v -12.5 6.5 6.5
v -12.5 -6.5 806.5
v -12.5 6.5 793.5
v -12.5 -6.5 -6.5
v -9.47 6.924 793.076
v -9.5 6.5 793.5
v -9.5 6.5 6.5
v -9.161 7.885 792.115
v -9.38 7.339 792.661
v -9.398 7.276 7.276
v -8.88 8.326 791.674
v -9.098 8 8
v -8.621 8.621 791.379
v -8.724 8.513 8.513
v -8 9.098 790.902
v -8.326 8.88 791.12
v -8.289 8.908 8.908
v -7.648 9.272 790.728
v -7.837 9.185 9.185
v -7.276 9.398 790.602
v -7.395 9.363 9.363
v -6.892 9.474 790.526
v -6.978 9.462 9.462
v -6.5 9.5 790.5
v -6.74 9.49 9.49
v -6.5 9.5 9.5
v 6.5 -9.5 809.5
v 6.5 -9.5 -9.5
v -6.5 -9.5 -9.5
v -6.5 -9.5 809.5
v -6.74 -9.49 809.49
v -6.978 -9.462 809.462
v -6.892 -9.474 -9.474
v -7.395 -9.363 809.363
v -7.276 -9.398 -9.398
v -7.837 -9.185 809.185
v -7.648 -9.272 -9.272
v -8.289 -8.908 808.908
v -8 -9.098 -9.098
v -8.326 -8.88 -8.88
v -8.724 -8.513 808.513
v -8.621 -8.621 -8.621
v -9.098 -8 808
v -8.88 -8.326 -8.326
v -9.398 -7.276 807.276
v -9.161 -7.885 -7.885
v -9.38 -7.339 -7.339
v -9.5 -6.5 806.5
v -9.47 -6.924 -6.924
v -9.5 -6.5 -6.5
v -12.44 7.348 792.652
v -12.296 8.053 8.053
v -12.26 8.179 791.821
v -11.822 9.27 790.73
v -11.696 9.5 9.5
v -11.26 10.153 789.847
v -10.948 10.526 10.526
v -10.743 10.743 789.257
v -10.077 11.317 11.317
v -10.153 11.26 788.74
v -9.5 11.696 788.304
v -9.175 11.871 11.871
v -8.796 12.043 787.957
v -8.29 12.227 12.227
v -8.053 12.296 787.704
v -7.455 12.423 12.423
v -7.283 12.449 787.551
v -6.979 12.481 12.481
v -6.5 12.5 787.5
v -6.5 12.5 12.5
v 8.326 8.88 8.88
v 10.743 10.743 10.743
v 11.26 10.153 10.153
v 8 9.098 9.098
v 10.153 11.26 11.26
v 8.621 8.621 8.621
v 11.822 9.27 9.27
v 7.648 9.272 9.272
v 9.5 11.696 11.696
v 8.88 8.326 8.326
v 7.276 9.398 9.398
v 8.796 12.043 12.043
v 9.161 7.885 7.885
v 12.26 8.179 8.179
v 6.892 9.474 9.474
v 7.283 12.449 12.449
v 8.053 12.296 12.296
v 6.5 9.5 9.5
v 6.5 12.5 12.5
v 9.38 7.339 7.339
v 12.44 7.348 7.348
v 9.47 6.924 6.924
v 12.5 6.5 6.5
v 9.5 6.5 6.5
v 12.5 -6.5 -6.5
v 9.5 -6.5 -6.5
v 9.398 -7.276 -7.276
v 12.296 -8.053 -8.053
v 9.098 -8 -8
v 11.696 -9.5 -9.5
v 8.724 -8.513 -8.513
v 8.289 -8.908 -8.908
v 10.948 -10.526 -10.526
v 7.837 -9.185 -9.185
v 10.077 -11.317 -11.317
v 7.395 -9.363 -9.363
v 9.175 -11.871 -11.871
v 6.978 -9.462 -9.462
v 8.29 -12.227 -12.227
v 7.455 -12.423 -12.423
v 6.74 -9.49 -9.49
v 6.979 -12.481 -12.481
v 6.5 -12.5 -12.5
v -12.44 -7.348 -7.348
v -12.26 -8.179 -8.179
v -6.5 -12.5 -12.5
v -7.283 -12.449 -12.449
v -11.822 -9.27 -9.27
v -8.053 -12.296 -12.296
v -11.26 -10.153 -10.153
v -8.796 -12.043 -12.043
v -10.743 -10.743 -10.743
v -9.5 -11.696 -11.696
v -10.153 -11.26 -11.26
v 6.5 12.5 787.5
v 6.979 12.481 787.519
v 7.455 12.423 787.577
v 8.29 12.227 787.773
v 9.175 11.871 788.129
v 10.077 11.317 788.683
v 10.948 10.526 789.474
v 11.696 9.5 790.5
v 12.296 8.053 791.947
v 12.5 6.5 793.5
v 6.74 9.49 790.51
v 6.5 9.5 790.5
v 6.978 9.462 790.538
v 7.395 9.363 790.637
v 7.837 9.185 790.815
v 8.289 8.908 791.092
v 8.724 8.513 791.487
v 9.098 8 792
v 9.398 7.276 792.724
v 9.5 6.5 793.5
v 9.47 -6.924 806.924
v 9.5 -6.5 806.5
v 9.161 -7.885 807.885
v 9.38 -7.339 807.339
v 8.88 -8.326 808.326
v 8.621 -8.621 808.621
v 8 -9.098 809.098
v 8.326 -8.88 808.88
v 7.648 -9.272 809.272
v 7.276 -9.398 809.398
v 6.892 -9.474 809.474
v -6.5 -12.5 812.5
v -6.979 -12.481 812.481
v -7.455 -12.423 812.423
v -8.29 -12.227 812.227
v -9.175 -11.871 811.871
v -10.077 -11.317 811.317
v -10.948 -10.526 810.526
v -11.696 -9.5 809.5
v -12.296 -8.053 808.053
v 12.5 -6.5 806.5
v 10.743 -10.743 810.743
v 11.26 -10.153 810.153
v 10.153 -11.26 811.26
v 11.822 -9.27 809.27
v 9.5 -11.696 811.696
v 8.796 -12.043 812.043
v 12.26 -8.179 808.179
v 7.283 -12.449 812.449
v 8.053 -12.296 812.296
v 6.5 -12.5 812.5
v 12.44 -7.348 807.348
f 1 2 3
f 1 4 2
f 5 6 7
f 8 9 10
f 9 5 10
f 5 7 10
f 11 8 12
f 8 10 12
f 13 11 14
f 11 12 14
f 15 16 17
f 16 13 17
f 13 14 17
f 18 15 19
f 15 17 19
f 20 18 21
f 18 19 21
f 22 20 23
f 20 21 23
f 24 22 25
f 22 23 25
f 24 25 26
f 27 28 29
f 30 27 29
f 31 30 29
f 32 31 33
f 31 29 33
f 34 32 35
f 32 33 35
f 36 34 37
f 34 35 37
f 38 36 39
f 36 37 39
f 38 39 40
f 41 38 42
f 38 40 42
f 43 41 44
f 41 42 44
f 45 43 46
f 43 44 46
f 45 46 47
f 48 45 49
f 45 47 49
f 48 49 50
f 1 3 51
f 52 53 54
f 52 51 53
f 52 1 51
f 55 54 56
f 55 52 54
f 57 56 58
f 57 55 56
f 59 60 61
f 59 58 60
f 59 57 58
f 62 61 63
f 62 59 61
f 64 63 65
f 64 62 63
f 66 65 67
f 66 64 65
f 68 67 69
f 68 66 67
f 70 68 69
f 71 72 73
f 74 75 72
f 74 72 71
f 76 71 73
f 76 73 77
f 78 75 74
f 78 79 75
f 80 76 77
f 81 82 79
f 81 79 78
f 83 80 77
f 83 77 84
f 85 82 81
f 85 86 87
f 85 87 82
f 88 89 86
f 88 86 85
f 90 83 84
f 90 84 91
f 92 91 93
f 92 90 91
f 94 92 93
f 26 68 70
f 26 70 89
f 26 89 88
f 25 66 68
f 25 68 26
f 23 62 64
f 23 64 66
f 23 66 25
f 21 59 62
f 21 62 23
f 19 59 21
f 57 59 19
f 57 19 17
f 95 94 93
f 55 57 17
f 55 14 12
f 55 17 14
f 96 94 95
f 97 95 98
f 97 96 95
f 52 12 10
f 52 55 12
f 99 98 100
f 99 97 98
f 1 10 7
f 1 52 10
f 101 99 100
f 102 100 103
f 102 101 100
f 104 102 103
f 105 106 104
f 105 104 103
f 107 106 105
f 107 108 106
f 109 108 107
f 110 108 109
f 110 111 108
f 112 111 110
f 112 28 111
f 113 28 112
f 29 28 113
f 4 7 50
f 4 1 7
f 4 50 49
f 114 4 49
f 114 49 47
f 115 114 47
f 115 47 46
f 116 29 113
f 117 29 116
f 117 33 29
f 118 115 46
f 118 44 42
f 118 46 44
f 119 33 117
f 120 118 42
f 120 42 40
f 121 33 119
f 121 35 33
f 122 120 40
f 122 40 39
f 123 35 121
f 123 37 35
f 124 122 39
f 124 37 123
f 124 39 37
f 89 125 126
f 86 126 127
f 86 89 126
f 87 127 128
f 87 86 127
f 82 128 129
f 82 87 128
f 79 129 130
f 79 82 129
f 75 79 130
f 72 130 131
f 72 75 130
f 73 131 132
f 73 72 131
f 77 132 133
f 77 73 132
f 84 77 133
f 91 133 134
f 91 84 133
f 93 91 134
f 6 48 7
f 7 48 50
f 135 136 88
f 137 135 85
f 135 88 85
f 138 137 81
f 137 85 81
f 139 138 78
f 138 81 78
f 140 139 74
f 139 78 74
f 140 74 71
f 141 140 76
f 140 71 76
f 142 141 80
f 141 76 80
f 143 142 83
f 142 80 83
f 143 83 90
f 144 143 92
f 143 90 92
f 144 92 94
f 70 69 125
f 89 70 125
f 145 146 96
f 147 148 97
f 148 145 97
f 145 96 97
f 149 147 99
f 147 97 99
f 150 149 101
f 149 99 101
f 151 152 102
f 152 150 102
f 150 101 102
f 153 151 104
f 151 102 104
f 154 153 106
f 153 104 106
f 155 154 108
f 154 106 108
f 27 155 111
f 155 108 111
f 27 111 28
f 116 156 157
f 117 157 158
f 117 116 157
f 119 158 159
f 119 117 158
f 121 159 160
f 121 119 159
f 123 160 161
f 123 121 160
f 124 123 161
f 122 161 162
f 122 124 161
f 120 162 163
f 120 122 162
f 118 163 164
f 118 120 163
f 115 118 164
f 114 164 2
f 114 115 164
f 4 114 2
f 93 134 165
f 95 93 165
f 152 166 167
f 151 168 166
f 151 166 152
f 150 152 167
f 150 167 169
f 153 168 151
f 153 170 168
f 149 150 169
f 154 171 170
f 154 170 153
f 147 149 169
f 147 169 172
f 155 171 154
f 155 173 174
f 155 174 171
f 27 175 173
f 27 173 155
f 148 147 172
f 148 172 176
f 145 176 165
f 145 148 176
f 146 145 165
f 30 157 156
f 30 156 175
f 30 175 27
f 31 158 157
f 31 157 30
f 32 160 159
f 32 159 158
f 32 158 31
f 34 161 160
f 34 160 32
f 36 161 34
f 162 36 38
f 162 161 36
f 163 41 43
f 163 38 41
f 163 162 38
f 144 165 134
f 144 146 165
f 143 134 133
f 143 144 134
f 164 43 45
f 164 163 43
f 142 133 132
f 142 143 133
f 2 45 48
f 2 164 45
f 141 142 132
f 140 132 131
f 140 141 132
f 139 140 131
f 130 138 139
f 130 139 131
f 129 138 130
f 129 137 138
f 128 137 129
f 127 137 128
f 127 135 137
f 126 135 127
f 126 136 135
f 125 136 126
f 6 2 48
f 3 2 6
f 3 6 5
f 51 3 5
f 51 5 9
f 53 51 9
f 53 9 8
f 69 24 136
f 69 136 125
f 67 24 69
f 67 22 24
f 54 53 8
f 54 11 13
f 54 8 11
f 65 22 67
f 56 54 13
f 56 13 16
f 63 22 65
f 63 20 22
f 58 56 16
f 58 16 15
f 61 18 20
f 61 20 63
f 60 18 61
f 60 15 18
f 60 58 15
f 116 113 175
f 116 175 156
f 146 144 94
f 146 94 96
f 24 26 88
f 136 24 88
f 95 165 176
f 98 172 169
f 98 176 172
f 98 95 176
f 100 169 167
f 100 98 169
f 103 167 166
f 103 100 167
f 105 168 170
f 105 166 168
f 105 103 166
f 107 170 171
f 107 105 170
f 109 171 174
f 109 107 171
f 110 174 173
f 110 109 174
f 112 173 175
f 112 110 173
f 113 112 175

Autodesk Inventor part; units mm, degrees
ref_plane "Start plane" through (0, 0, -12.5) normal (0, 0, 1) x (1, 0, 0)
ref_plane "End plane" through (0, 0, 812.5) normal (0, 0, 1) x (1, 0, 0)
sketch "Sketch" plane through (0, 0, 0) normal (0, 0, 1) x (1, 0, 0)
  line L0 (-12.5, -6.5) -> (-12.5, 6.5)
  line L1 (-6.5, 12.5) -> (6.5, 12.5)
  line L2 (12.5, 6.5) -> (12.5, -6.5)
  line L3 (6.5, -12.5) -> (-6.5, -12.5)
  arc A0 (-12.5, -6.5) -> (-6.5, -12.5) centre (-6.5, -6.5) ccw
  arc A1 (-6.5, 12.5) -> (-12.5, 6.5) centre (-6.5, 6.5) ccw
  arc A2 (12.5, 6.5) -> (6.5, 12.5) centre (6.5, 6.5) ccw
  arc A3 (6.5, -12.5) -> (12.5, -6.5) centre (6.5, -6.5) ccw
  arc A4 (-6.5, 9.5) -> (-9.5, 6.5) centre (-6.5, 6.5) ccw
  line L4 (-6.5, 9.5) -> (6.5, 9.5)
  arc A5 (9.5, 6.5) -> (6.5, 9.5) centre (6.5, 6.5) ccw
  line L5 (9.5, 6.5) -> (9.5, -6.5)
  arc A6 (6.5, -9.5) -> (9.5, -6.5) centre (6.5, -6.5) ccw
  line L6 (6.5, -9.5) -> (-6.5, -9.5)
  arc A7 (-9.5, -6.5) -> (-6.5, -9.5) centre (-6.5, -6.5) ccw
  line L7 (-9.5, -6.5) -> (-9.5, 6.5)
  line L8 (0, 19.2397) -> (0, -19.2397) construction
  line L9 (-19.2397, 0) -> (19.2397, 0) construction
  dimension "d7" = 6
  dimension "d10" = 25
  dimension "d11" = 25
  dimension "d12" = 3
  dimension "d15" = 12.5
  dimension "d16" = 12.5
extrude "Body" add sketch "Sketch" along normal up to surface (825 mm away) from surface at -12.5
sketch "Sketch3" plane through (0, 0, 0) normal (0, 0, 1) x (1, 0, 0)
  line L0 (0, 0) -> (10, 0)
ref_plane "Work Plane3" through (0, 0, 0) normal (0, -1, 0) x (1, 0, 0)
sketch "Sketch4" plane through (0, 0, 0) normal (0, -1, 0) x (1, 0, 0)
  line L0 (-2, -12.5) -> (12, -12.5)
  line L1 (-2, 812.5) -> (12, 812.5)
  dimension "d18" = 825
ref_plane "Work Plane4" through (0, -12.5, 812.5) normal (0, 0.7071, 0.7071) x (1, 0, 0)
split "Split1" plane through (0, -12.5, 812.5) removes the side toward (0, 0.7071, 0.7071)
ref_plane "Work Plane5" through (0, -12.5, -12.5) normal (0, 0.7071, -0.7071) x (1, 0, 0)
split "Split2" plane through (0, -12.5, -12.5) removes the side toward (0, 0.7071, -0.7071)
equation "\"d7\" = G_IR"
equation "\"d10\" = G_H"
equation "\"d11\" = G_W"
equation "\"d12\" = G_T"
equation "\"d15\" = 0.5 * d10"
equation "\"d16\" = 0.5 * d11"
equation "\"d3\" = G_L"
equation "\"G_W\" = 25"
equation "\"G_H\" = 25"
equation "\"G_T\" = 3"
equation "\"G_IR\" = 6"
equation "\"G_L\" = d18"
equation "\"G_OFFSET_START\" = 12.5"
equation "\"G_OFFSET_END\" = 12.5"
equation "\"d13\" = -G_OFFSET_START"
equation "\"d14\" = G_OFFSET_END + B_L"
equation "\"B_L\" = 800"
properties part number "AS 1163 - C350L0 25x25x3.0 SHS - 825" material "Steel, Mild"
